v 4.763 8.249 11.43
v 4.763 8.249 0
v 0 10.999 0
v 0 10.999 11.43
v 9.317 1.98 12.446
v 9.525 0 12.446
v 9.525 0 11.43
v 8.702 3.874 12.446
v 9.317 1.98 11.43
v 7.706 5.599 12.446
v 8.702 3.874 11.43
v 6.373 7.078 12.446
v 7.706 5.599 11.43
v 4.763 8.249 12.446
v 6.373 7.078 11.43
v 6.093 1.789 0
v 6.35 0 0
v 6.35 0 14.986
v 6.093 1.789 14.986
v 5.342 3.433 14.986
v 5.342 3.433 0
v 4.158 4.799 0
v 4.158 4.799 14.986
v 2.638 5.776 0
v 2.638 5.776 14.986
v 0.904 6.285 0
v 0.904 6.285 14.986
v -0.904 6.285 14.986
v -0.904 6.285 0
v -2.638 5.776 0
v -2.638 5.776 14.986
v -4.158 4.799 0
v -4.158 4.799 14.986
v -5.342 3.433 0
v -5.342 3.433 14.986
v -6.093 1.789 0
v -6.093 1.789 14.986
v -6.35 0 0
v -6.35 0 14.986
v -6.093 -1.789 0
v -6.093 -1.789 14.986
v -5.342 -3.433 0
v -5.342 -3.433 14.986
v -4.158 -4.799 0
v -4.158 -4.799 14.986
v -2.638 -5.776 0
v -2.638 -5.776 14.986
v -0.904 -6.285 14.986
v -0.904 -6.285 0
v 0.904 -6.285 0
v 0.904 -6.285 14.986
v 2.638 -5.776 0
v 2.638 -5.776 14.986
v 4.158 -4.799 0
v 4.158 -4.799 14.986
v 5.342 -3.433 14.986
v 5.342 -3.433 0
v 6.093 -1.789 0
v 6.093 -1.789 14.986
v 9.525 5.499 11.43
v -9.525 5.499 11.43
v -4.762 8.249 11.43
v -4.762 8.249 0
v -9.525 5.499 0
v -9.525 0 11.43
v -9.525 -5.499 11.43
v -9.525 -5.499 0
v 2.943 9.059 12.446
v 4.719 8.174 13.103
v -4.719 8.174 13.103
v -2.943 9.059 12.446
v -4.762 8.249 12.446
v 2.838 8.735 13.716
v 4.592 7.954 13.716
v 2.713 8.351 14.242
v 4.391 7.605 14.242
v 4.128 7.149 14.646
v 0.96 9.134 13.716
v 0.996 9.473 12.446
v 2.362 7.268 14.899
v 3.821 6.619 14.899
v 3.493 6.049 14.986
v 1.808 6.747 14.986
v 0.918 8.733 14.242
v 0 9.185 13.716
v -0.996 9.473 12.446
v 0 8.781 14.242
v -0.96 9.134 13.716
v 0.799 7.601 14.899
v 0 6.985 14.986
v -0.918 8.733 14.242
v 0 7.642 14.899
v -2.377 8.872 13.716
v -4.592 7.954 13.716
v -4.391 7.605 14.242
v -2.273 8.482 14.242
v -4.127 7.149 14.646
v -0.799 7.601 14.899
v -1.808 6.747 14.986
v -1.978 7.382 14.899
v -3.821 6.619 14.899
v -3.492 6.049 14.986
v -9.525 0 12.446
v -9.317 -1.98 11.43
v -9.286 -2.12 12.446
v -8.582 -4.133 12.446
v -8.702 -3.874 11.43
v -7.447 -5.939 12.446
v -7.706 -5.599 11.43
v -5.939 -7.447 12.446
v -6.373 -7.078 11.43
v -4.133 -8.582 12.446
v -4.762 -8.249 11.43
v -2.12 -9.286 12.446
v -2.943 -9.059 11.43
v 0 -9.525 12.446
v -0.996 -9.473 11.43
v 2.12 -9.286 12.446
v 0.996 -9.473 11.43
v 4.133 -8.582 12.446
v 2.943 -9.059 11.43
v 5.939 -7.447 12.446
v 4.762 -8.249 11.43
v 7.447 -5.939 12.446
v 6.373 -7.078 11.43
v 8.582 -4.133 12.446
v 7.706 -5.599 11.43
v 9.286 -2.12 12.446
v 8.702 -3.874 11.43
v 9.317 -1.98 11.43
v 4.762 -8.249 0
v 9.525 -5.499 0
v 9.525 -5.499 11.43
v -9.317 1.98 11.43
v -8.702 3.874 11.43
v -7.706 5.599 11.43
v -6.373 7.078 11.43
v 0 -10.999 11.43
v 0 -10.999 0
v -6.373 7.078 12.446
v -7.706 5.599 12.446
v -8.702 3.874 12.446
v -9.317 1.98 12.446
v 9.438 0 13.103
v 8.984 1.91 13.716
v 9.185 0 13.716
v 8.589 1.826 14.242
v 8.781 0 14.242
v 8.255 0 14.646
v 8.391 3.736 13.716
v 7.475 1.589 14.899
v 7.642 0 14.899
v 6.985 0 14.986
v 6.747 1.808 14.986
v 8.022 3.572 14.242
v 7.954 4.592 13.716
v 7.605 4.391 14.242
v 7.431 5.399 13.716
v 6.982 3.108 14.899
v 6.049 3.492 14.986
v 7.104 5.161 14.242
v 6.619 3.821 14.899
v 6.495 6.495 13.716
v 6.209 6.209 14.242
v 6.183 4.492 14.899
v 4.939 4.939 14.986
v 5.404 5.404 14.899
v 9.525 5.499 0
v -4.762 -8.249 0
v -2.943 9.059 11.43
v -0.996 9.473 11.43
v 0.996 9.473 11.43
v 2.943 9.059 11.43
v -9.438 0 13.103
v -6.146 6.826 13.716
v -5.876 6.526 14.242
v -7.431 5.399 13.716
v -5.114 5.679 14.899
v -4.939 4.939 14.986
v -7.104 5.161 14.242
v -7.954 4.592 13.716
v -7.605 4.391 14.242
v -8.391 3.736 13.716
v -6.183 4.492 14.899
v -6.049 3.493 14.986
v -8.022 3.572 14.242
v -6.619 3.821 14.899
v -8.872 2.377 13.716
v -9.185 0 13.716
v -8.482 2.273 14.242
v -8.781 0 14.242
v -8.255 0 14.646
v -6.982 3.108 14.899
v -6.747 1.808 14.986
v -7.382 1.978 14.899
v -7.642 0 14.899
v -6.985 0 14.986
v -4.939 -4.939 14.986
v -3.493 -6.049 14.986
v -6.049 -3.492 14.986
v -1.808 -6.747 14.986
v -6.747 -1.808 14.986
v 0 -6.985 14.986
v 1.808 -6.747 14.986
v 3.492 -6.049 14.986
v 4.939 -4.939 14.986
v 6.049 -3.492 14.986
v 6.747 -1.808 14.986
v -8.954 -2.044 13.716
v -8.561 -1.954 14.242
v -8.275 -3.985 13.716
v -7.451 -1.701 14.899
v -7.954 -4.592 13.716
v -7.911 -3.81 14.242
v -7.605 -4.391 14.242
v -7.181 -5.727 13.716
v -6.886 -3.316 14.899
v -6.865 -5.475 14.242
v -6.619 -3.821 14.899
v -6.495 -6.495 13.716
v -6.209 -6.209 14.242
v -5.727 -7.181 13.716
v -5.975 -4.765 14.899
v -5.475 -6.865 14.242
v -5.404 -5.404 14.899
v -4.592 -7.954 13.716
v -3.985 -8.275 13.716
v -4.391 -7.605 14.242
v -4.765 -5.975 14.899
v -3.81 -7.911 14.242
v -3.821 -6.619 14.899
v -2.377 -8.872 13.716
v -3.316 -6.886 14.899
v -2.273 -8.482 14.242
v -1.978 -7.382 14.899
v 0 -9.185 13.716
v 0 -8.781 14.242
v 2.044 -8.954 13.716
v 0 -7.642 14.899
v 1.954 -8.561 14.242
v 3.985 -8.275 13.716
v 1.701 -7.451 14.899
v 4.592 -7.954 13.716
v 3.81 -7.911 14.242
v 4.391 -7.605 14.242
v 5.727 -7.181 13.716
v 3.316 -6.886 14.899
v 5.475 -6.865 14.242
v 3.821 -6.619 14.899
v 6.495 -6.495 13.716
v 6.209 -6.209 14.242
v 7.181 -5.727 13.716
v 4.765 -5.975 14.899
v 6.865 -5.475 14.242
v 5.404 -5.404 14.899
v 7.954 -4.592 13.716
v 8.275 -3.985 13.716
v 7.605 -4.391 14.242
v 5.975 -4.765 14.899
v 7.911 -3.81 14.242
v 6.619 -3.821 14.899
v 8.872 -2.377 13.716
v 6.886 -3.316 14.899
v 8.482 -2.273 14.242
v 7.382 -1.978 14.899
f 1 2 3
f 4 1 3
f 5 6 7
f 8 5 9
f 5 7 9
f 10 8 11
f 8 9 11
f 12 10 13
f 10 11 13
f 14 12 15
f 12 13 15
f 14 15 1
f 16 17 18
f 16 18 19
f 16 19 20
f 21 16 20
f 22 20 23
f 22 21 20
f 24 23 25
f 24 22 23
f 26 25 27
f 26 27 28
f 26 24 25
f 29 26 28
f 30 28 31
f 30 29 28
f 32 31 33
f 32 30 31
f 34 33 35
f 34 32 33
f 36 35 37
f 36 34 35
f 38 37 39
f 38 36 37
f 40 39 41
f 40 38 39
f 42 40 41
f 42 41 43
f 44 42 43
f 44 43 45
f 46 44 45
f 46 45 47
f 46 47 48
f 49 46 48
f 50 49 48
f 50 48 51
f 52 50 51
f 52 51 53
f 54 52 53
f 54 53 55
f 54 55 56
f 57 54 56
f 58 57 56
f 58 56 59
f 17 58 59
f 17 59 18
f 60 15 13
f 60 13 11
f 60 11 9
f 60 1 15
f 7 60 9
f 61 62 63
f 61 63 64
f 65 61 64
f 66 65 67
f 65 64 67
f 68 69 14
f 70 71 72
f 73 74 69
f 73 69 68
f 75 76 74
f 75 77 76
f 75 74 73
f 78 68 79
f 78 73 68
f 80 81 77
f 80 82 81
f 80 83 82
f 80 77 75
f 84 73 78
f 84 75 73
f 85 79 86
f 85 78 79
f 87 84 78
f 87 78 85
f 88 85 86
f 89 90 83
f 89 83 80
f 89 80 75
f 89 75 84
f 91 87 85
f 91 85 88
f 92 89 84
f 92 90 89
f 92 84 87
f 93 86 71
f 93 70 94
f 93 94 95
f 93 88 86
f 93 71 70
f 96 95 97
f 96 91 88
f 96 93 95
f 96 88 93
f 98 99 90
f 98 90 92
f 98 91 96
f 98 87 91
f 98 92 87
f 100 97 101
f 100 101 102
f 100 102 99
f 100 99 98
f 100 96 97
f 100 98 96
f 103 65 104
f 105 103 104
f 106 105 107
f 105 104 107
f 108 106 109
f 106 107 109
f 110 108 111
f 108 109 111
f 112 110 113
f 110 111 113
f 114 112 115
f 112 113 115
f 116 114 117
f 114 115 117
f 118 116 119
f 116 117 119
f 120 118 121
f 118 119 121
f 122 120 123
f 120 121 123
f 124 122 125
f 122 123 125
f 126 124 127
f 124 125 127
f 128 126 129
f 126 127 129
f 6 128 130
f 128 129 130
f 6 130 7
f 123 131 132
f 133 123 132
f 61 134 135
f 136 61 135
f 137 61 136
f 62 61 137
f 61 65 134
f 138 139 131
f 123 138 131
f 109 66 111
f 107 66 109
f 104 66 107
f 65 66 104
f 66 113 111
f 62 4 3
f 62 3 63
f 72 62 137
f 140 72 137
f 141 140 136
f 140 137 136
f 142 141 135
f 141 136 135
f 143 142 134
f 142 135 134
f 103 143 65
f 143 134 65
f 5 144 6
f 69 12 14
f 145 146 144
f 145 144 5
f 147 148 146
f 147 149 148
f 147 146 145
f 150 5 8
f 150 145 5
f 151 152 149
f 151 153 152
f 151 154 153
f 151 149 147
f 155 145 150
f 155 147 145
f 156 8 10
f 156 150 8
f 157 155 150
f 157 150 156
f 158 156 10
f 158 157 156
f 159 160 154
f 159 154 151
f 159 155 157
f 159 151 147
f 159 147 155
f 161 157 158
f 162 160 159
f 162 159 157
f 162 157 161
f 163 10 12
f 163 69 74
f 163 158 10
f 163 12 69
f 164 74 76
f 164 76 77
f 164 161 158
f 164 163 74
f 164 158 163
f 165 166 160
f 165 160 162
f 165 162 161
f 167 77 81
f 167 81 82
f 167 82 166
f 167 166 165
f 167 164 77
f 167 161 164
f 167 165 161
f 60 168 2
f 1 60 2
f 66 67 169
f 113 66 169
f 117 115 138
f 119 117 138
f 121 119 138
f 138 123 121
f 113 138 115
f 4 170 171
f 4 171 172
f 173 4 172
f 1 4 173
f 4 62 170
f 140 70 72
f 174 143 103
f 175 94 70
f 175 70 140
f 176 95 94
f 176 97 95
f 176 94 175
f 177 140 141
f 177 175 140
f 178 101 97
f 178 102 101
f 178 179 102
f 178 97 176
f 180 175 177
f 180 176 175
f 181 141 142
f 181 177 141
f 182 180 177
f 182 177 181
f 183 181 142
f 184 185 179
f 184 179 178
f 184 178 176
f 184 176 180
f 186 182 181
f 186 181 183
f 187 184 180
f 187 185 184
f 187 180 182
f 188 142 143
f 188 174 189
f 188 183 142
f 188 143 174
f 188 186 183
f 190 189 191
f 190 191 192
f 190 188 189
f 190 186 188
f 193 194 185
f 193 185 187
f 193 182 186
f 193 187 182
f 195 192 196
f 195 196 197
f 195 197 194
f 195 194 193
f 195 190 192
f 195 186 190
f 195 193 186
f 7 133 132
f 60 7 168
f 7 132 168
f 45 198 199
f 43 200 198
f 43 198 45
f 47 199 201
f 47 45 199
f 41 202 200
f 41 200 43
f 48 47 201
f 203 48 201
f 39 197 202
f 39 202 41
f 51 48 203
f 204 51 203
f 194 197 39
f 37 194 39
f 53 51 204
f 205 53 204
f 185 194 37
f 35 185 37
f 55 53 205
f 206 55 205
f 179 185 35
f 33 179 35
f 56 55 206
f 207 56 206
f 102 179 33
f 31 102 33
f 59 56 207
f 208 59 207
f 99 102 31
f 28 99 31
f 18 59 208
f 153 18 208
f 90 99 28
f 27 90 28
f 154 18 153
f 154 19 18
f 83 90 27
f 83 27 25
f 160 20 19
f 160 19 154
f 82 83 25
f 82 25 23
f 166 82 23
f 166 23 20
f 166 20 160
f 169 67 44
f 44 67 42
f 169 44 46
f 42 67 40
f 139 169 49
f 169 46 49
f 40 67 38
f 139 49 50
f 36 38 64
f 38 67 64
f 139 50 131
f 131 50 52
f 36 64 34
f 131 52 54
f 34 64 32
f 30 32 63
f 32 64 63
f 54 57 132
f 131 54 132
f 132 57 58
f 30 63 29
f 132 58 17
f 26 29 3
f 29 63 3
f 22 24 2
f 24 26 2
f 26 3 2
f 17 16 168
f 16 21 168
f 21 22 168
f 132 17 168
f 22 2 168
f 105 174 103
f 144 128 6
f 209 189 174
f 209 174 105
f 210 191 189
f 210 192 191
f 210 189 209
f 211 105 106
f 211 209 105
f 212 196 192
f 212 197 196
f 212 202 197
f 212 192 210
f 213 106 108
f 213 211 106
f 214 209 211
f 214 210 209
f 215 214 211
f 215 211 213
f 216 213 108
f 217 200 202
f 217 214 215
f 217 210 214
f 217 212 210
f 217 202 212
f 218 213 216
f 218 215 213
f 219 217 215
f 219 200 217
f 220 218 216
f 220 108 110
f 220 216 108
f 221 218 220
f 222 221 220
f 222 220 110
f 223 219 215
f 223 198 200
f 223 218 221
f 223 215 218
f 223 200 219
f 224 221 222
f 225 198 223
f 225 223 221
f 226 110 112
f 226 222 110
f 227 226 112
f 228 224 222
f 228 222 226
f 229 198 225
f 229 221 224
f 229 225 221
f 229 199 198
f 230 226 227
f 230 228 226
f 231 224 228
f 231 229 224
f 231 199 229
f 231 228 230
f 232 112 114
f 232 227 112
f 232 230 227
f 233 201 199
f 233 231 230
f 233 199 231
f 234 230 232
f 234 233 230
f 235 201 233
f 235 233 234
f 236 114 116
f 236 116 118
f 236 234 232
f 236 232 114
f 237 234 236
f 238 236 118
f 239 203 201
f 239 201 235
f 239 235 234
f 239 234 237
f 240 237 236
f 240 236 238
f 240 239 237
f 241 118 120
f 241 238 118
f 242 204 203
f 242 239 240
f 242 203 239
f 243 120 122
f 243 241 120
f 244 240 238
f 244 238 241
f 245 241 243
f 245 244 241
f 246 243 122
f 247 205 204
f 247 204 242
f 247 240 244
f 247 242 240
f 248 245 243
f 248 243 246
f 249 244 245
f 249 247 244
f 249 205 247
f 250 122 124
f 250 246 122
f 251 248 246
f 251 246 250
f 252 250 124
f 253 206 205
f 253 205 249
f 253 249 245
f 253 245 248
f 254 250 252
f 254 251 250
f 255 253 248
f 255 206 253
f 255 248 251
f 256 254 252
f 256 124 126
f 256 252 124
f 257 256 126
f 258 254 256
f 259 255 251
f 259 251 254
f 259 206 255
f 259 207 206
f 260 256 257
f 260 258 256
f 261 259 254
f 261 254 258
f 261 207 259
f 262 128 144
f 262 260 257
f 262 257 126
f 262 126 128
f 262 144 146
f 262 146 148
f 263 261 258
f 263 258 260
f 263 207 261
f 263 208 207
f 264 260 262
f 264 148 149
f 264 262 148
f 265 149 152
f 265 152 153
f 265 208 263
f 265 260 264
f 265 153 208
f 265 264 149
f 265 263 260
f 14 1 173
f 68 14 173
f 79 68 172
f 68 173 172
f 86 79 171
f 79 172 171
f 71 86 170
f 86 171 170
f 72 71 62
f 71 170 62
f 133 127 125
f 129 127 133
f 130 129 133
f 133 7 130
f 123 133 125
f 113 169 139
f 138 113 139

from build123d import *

# Parameters (mm, degrees)
F0_R     = 6.35
F1_DEPTH = 11.43
F2_DEPTH = 14.986
F3_R     = 2.54


with BuildPart() as f1:
    # F0 (on Top) → F1 (new body)
    with BuildSketch(Plane.XY):
        with BuildLine():
            ThreePointArc((4.7624999017, -8.2488920278), (8.2488919427, -4.7625000491), (9.525, 0))
            ThreePointArc((9.525, 0), (8.2488920139, 4.7624999258), (4.7625001484, 8.2488918854))
            ThreePointArc((4.7625001484, 8.2488918854), (2.371e-07, 9.525), (-4.7624997378, 8.2488921224))
            ThreePointArc((-4.7624997378, 8.2488921224), (-8.2488918954, 4.7625001311), (-9.525, 0))
            ThreePointArc((-9.525, 0), (-8.2488919427, -4.7625000491), (-4.7624999017, -8.2488920278))
            ThreePointArc((-4.7624999017, -8.2488920278), (0, -9.525), (4.7624999017, -8.2488920278))
        make_face()
        Circle(F0_R, mode=Mode.SUBTRACT)
        with BuildLine():
            ThreePointArc((-9.525, 0), (-8.2488918954, 4.7625001311), (-4.7624997378, 8.2488921224))
            Line((-4.7624997378, 8.2488921224), (-9.525, 5.499261314))
            Line((-9.525, 5.499261314), (-9.525, 0))
        make_face()
        with BuildLine():
            ThreePointArc((-4.7624997378, 8.2488921224), (2.371e-07, 9.525), (4.7625001484, 8.2488918854))
            Line((4.7625001484, 8.2488918854), (0, 10.9985226281))
            Line((0, 10.9985226281), (-4.7624997378, 8.2488921224))
        make_face()
        with BuildLine():
            ThreePointArc((4.7625001484, 8.2488918854), (8.2488920139, 4.7624999258), (9.525, 0))
            Line((9.525, 0), (9.525, 5.499261314))
            Line((9.525, 5.499261314), (4.7625001484, 8.2488918854))
        make_face()
        with BuildLine():
            Line((9.525, -5.499261314), (9.525, 0))
            ThreePointArc((9.525, 0), (8.2488919427, -4.7625000491), (4.7624999017, -8.2488920278))
            Line((4.7624999017, -8.2488920278), (9.525, -5.499261314))
        make_face()
        with BuildLine():
            Line((0, -10.9985226281), (4.7624999017, -8.2488920278))
            ThreePointArc((4.7624999017, -8.2488920278), (0, -9.525), (-4.7624999017, -8.2488920278))
            Line((-4.7624999017, -8.2488920278), (0, -10.9985226281))
        make_face()
        with BuildLine():
            Line((-9.525, -5.499261314), (-4.7624999017, -8.2488920278))
            ThreePointArc((-4.7624999017, -8.2488920278), (-8.2488919427, -4.7625000491), (-9.525, 0))
            Line((-9.525, 0), (-9.525, -5.499261314))
        make_face()
    extrude(amount=F1_DEPTH)

    # F0 (on Top) → F2 (join)
    with BuildSketch(Plane.XY):
        with BuildLine():
            ThreePointArc((4.7624999017, -8.2488920278), (8.2488919427, -4.7625000491), (9.525, 0))
            ThreePointArc((9.525, 0), (8.2488920139, 4.7624999258), (4.7625001484, 8.2488918854))
            ThreePointArc((4.7625001484, 8.2488918854), (2.371e-07, 9.525), (-4.7624997378, 8.2488921224))
            ThreePointArc((-4.7624997378, 8.2488921224), (-8.2488918954, 4.7625001311), (-9.525, 0))
            ThreePointArc((-9.525, 0), (-8.2488919427, -4.7625000491), (-4.7624999017, -8.2488920278))
            ThreePointArc((-4.7624999017, -8.2488920278), (0, -9.525), (4.7624999017, -8.2488920278))
        make_face()
        Circle(F0_R, mode=Mode.SUBTRACT)
    extrude(amount=F2_DEPTH)

    # F3
    f3_edges = [f1.edges().sort_by_distance(p)[0] for p in [
        (-9.525, 0, 14.986),
    ]]
    fillet(f3_edges, radius=F3_R)


solid = f1.part
